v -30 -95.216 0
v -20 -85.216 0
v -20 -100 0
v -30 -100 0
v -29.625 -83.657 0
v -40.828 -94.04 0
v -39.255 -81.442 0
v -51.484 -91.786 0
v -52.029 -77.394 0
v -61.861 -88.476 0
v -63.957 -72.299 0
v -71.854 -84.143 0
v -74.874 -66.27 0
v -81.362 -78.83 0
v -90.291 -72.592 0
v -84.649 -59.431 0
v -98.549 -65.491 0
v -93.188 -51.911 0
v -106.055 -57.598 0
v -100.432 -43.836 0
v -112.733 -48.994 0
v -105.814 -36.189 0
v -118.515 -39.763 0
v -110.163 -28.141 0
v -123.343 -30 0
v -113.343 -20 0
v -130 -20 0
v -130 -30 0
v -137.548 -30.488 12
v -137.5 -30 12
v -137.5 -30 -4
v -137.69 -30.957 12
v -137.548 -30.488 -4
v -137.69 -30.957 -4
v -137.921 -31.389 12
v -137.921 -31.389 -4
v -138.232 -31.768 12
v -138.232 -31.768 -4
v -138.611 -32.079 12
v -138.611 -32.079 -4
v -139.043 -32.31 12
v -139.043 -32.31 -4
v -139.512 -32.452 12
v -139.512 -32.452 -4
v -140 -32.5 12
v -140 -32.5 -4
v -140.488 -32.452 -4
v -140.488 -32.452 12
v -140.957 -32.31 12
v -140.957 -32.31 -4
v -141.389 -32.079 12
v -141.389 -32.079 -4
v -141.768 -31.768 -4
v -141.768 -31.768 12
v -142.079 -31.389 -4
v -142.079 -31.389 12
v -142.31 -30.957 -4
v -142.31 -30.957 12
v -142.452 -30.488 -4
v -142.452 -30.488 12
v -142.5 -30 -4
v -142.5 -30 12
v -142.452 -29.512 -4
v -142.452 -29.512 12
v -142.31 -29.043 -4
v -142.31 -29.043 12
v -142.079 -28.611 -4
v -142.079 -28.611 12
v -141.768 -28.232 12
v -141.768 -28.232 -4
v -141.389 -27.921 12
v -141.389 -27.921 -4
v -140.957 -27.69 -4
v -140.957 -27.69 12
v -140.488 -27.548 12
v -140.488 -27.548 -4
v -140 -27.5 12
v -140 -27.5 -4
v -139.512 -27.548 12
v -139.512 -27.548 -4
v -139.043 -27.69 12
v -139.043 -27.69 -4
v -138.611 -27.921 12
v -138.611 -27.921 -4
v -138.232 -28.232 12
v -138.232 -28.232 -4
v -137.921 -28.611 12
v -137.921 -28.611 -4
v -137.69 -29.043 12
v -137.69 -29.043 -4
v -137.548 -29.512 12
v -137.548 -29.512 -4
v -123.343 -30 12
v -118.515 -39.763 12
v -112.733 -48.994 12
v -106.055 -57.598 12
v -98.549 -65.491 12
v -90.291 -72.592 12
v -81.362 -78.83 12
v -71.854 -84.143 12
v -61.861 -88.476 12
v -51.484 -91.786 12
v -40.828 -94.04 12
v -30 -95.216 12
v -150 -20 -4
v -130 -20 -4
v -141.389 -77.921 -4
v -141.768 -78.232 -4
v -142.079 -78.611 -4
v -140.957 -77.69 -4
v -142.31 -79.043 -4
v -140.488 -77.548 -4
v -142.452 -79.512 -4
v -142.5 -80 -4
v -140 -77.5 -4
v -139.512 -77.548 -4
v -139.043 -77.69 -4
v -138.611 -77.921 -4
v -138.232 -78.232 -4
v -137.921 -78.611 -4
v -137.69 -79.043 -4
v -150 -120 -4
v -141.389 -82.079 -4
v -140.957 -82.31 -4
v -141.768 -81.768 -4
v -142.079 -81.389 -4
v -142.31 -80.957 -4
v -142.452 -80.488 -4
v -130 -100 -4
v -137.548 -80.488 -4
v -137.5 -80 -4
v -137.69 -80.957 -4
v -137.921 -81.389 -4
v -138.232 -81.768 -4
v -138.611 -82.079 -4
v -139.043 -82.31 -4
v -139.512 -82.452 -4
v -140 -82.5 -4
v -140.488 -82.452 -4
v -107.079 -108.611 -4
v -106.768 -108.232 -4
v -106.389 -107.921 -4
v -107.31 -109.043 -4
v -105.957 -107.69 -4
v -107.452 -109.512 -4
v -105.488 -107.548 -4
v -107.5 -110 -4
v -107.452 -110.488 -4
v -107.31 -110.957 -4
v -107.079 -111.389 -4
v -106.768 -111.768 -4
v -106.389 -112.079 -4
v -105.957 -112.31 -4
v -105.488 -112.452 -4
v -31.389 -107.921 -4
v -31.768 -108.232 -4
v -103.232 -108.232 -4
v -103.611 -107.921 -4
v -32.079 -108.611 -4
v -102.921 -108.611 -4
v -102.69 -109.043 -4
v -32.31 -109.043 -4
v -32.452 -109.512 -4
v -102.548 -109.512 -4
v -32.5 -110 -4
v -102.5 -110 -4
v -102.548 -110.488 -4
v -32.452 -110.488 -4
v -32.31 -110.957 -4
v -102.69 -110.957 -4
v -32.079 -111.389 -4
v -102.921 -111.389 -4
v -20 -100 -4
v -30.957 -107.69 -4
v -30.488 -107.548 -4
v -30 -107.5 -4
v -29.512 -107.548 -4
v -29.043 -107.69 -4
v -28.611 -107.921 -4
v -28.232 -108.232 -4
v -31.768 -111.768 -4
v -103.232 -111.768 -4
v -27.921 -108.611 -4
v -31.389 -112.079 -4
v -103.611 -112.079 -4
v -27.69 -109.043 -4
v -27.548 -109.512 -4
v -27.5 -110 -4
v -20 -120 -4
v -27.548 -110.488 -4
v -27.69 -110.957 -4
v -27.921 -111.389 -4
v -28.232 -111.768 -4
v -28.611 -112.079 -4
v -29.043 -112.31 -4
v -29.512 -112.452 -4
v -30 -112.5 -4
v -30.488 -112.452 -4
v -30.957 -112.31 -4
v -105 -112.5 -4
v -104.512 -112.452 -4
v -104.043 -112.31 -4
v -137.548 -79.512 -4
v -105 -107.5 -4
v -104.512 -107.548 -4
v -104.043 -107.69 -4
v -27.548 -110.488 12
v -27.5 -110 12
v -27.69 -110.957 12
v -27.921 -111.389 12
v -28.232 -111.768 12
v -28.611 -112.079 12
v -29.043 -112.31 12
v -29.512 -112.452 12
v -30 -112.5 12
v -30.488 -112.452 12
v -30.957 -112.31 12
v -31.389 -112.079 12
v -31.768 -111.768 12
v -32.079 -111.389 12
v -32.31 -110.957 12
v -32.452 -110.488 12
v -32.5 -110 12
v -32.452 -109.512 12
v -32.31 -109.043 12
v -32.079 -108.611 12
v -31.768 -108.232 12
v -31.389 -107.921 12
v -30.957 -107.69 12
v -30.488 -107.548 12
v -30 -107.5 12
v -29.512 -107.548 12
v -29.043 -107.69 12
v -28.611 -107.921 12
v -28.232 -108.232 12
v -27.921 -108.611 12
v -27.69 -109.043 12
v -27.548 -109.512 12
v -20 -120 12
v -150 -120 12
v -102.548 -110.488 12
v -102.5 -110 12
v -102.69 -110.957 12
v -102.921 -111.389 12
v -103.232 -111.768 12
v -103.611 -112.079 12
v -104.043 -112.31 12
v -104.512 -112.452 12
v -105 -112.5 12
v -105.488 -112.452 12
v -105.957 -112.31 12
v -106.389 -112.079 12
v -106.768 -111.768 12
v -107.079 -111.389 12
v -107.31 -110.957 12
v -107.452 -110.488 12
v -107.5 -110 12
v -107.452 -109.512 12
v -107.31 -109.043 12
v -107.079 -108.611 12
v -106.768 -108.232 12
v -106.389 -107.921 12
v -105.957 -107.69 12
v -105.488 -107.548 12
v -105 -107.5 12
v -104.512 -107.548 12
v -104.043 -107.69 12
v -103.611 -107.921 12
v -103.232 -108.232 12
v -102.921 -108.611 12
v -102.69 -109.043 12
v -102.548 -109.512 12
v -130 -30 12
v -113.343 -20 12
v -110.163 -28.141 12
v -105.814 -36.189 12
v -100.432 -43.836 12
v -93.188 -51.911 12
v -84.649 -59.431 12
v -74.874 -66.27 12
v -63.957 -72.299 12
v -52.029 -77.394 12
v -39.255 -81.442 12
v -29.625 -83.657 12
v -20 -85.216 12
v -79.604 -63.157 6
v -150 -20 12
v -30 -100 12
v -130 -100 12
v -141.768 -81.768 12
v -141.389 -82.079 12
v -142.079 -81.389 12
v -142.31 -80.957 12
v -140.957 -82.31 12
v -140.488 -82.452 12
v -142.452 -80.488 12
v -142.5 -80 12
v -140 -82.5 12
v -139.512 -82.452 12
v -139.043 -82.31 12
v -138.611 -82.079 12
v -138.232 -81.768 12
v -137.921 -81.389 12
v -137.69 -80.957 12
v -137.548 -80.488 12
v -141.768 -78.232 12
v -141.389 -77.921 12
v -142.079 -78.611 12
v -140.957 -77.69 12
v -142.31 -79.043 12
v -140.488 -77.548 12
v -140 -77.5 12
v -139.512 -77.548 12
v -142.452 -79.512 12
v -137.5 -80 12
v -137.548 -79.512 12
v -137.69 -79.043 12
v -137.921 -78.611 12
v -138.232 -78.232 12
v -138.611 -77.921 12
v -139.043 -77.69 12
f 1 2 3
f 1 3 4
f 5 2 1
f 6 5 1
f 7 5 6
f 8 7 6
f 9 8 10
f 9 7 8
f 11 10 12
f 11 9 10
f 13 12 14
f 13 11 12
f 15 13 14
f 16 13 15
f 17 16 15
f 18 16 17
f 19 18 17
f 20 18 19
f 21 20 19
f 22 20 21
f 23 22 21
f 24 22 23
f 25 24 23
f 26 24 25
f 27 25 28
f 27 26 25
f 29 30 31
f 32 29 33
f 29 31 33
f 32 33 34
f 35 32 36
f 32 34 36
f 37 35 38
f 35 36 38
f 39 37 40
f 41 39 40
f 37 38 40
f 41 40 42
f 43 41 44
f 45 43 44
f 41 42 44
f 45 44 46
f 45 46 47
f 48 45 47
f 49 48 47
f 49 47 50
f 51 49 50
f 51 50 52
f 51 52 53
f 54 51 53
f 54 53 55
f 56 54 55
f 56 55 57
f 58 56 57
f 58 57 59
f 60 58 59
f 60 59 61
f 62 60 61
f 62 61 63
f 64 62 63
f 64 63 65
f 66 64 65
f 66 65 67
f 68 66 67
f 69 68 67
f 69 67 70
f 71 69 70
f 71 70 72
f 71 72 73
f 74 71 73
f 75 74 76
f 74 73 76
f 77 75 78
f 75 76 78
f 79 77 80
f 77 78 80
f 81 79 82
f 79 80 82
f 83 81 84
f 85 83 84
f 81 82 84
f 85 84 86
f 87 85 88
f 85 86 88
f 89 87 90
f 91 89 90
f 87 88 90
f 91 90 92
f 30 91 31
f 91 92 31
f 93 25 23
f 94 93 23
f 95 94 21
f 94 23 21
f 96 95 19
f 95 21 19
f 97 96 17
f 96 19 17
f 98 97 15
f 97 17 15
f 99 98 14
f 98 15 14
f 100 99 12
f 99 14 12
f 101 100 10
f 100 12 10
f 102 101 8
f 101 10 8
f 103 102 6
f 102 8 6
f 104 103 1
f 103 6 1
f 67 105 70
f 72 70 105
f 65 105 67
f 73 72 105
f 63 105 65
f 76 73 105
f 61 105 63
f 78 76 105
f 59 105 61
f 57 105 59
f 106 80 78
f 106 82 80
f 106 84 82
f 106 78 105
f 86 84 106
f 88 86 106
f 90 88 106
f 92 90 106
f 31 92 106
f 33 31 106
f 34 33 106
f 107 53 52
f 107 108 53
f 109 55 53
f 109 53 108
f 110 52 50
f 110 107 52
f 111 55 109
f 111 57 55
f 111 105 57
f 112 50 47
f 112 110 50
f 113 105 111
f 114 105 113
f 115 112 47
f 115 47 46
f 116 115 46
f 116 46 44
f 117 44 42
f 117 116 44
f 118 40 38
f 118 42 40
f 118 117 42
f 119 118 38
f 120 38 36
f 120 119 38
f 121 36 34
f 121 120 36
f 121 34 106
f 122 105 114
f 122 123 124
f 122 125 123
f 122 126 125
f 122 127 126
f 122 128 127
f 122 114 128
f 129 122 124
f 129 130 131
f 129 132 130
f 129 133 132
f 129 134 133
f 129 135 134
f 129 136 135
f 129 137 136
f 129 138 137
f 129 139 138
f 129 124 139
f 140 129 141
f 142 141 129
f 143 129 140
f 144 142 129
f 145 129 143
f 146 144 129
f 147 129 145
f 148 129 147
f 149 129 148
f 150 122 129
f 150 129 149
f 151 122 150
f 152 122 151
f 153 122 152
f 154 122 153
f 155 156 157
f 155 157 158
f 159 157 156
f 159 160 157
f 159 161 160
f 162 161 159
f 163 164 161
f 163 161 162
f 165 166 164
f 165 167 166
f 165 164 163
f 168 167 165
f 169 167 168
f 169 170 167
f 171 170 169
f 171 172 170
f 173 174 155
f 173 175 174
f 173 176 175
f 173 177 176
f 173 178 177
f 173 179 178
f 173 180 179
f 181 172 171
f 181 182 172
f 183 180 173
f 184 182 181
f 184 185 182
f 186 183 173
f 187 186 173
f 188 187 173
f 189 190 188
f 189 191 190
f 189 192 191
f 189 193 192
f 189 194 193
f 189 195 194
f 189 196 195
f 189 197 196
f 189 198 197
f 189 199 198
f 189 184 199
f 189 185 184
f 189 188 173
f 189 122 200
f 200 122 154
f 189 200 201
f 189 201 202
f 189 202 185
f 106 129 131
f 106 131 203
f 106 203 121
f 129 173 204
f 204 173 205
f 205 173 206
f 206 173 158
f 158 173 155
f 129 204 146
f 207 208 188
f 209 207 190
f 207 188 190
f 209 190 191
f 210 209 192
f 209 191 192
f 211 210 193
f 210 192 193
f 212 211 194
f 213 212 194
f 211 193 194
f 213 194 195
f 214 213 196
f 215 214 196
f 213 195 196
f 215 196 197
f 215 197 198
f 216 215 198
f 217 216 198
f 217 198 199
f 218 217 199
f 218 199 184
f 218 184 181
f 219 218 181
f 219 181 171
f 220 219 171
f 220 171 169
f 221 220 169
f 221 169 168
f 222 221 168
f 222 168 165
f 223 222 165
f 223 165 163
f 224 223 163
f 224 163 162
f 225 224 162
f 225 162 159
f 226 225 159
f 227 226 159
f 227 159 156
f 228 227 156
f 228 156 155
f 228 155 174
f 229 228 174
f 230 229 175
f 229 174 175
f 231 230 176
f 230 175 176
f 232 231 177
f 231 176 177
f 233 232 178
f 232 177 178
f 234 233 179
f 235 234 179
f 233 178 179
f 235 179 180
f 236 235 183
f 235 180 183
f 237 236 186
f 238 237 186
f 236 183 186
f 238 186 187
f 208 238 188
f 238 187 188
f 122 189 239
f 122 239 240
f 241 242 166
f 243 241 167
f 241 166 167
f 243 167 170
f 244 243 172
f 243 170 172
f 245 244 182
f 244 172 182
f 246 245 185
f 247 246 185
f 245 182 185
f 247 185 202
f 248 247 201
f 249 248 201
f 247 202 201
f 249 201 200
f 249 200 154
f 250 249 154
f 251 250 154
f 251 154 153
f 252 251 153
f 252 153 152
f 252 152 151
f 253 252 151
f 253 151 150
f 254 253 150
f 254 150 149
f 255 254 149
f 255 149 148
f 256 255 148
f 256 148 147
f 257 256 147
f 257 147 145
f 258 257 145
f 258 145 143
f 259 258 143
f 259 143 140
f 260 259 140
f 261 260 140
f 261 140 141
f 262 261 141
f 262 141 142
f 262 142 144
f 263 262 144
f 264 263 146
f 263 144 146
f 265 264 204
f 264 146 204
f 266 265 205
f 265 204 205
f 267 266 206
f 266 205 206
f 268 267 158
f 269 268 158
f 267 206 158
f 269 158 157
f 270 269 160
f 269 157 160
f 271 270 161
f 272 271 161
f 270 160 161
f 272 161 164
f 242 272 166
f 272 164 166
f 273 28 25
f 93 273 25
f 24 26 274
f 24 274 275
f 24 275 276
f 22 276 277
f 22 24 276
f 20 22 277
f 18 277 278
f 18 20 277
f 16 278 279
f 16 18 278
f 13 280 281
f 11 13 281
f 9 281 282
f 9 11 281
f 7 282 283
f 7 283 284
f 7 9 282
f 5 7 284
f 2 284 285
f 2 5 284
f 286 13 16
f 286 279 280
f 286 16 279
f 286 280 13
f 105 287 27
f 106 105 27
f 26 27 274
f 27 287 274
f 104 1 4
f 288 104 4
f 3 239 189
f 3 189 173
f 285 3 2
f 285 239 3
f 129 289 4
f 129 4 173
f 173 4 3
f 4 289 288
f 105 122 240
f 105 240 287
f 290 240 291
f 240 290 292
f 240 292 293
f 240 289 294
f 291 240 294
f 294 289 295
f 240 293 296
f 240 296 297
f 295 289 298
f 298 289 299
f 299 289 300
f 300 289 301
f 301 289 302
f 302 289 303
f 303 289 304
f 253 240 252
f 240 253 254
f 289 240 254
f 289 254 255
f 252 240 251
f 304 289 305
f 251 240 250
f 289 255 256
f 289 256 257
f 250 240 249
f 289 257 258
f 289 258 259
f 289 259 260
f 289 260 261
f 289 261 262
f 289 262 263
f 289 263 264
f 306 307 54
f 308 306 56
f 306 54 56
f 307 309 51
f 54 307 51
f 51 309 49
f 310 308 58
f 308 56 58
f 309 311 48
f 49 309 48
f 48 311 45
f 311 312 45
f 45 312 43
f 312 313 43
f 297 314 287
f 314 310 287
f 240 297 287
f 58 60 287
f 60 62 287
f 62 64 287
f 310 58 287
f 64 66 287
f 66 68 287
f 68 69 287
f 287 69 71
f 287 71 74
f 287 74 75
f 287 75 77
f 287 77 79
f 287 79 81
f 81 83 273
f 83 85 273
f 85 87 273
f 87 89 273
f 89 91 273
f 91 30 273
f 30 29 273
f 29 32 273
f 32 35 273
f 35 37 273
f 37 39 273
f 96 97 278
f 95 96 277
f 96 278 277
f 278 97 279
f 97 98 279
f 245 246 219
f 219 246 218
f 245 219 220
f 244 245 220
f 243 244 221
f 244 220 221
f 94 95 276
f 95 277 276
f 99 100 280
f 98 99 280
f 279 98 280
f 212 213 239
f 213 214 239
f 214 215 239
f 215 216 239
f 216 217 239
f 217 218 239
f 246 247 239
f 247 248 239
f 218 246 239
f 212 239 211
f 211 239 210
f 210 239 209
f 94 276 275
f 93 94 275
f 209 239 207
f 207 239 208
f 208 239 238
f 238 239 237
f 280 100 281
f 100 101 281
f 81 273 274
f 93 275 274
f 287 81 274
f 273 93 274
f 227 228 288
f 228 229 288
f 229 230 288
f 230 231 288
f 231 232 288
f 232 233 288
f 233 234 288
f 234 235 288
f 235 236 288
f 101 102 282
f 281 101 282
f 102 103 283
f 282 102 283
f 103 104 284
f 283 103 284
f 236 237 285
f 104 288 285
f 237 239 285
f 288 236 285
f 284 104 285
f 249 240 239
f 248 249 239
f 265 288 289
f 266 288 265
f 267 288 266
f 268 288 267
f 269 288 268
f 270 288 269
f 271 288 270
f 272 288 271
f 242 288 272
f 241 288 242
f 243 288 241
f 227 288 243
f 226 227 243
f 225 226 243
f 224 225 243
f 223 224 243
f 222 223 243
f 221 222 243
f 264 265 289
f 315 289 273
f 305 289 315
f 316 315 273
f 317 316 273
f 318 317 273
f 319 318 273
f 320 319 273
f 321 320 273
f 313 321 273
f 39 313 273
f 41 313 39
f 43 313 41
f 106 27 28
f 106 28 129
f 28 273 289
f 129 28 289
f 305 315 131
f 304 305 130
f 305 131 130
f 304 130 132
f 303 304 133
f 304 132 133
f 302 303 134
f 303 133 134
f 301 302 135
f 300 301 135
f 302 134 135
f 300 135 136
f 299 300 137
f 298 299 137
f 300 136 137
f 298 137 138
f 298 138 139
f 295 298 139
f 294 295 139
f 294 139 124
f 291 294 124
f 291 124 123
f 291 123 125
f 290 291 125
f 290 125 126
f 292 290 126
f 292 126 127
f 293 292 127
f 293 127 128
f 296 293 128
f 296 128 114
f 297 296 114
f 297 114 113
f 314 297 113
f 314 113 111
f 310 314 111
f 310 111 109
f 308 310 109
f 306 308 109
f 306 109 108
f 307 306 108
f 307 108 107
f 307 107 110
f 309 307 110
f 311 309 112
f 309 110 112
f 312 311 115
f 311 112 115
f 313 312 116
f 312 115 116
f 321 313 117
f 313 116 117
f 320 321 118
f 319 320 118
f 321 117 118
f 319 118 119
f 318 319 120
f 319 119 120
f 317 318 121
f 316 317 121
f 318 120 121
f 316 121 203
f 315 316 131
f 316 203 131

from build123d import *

# Parameters (mm, degrees)
F1_DEPTH  = 12
F2_W      = 130
F2_H      = 20
F3_DEPTH  = 5
F4_W      = 105
F4_H      = 20
F5_DEPTH  = 5
F7_W      = 20
F7_H      = 100
F7_R      = 2.5
F7_H_2    = 20
F7_W_2    = 130
F8_DEPTH  = 25
F9_DEPTH  = 5
F10_W     = 130
F10_H     = 20
F10_W_2   = 20
F10_H_2   = 100
F11_DEPTH = 25
F12_W     = 100
F12_H     = 9
F13_DEPTH = 150
F15_DEPTH = 25


with BuildPart() as f1:
    # F0 (on Top) → F1 (new body)
    with BuildSketch(Plane.XY):
        with BuildLine():
            add(Edge.make_bspline(
                [(-116.5, 0), (-116.5, -86.5), (0, -86.5)],
                knots=[3.1415926536, 3.1415926536, 3.1415926536, 4.7123889804, 4.7123889804, 4.7123889804], degree=2, weights=[1, 0.7071067812, 1]))
            Line((-116.5, 0), (-116.5, -86.5))
            Line((-116.5, -86.5), (0, -86.5))
        make_face()
        Polygon((-116.5, -86.5), (-116.5, 0), (-130, 0), (-130, -100), (0, -100), (0, -86.5), align=None)
    extrude(amount=F1_DEPTH)

    # F2 (on face) → F3 (join)
    with BuildSketch(Plane.XZ.offset(100)):
        with Locations((-65, 6)):
            Rectangle(F2_W, F2_H)
    extrude(amount=F3_DEPTH)

    # F4 (on face) → F5 (join)
    with BuildSketch(Plane(origin=(-130, 0, 0), x_dir=(0, -1, 0), z_dir=(-1, 0, 0))):
        with Locations((52.5, 6)):
            Rectangle(F4_W, F4_H)
    extrude(amount=F5_DEPTH)

    # F7 (on face) → F8 (join)
    with BuildSketch(Plane(origin=(0, 0, -4), x_dir=(1, 0, 0), z_dir=(0, 0, -1))):
        with Locations((-140, 50)):
            Rectangle(F7_W, F7_H)
        with Locations((-140, 30)):
            Circle(F7_R, mode=Mode.SUBTRACT)
        with Locations((-140, 80)):
            Circle(F7_R, mode=Mode.SUBTRACT)
        with Locations((-140, 110)):
            Rectangle(F7_W, F7_H_2)
        with Locations((-65, 110)):
            Rectangle(F7_W_2, F7_H_2)
        with Locations((-105, 110)):
            Circle(F7_R, mode=Mode.SUBTRACT)
        with Locations((-30, 110)):
            Circle(F7_R, mode=Mode.SUBTRACT)
    extrude(amount=-F8_DEPTH)

    # F6 (on face) → F9 (join)
    with BuildSketch(Plane.XY.offset(16)):
        Polygon((-120, 0), (-135, 0), (-135, -105), (0, -105), (0, -90), (-120, -90), align=None)
    extrude(amount=F9_DEPTH)

    # F10 (on Top) → F11 (cut, symmetric)
    with BuildSketch(Plane.XY):
        with Locations((-85, -10)):
            Rectangle(F10_W, F10_H)
        with Locations((-10, -10)):
            Rectangle(F10_W_2, F10_H)
        with Locations((-10, -70)):
            Rectangle(F10_W_2, F10_H_2)
    extrude(amount=F11_DEPTH, both=True, mode=Mode.SUBTRACT)

    # F12 (on face) → F13 (cut)
    with BuildSketch(Plane.YZ.offset(-20)):
        with Locations((-70, 16.5)):
            Rectangle(F12_W, F12_H)
    extrude(amount=-F13_DEPTH, mode=Mode.SUBTRACT)

    # F14 (on face) → F15 (cut)
    with BuildSketch(Plane(origin=(0, 0, 0), x_dir=(1, 0, 0), z_dir=(0, 0, -1))):
        with BuildLine():
            Line((-30, 100), (-130, 100))
            Line((-130, 100), (-130, 30))
            Line((-130, 30), (-123.3431933691, 30))
            ThreePointArc((-123.3431933691, 30), (-85.9046810739, 75.8231903114), (-30, 95.2158076494))
            Line((-30, 95.2158076494), (-30, 100))
        make_face()
    extrude(amount=-F15_DEPTH, mode=Mode.SUBTRACT)


solid = f1.part
